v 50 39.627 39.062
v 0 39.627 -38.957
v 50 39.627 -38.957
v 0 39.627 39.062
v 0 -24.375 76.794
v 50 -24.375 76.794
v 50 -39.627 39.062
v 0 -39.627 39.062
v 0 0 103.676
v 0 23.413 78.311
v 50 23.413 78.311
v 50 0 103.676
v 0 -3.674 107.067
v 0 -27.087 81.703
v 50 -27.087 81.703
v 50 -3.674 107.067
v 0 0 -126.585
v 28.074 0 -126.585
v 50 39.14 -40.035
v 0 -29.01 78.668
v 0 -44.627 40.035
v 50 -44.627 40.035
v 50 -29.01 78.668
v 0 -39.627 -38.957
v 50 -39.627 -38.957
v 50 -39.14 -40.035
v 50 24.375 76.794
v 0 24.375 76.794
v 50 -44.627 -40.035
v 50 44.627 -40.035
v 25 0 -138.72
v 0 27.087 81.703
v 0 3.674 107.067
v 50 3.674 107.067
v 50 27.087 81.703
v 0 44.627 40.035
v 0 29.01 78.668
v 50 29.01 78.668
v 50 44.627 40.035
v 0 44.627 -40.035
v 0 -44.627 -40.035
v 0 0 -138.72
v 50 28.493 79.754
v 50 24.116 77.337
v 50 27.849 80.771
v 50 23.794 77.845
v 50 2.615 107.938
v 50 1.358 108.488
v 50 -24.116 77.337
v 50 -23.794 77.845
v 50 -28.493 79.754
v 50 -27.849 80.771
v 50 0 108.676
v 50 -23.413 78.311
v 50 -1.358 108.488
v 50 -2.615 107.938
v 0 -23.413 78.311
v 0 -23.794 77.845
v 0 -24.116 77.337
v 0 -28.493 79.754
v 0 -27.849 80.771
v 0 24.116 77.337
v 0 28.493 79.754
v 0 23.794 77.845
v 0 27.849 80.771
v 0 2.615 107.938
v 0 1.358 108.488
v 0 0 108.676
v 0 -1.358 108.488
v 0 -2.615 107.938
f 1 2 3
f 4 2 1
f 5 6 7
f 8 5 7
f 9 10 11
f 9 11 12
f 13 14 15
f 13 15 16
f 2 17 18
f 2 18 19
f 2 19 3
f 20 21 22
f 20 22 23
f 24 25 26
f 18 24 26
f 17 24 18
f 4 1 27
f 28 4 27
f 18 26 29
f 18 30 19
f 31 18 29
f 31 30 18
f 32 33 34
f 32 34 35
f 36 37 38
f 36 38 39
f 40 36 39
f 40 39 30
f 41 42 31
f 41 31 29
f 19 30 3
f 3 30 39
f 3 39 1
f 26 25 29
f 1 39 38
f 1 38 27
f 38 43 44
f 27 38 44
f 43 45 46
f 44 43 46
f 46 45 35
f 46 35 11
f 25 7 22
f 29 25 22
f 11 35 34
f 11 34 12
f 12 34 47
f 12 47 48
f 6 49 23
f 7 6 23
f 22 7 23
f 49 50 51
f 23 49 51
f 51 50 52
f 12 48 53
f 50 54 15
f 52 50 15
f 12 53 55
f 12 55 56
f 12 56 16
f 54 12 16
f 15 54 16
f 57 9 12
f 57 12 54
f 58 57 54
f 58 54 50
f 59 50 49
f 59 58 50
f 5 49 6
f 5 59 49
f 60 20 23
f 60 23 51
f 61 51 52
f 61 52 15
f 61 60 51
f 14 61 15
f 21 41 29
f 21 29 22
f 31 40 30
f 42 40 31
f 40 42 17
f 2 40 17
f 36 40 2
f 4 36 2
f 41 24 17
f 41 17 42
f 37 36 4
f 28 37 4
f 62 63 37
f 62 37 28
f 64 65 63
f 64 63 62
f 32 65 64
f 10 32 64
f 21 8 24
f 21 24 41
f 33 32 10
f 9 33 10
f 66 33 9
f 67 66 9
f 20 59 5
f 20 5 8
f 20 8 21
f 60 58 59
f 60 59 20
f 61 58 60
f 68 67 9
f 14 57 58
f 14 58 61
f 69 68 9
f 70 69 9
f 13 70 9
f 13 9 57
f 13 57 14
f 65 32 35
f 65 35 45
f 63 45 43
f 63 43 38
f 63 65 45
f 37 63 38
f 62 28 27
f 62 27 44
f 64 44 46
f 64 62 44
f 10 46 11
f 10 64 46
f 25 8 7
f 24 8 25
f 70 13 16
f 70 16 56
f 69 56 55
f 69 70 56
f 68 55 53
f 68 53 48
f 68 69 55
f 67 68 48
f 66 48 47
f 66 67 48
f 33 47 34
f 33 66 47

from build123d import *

# Parameters (mm, degrees)
BOSS_EXTRUDE1_DEPTH = 50
SHELL1_DEPTH        = 50
CUT_EXTRUDE2_DEPTH  = 173.364622498


# Read off the part's stored shape, not the designer's step: Shell1
with BuildPart() as part:
    # Sketch1 → Boss-Extrude1 (new body)
    with BuildSketch(Plane.YZ):
        with BuildLine():
            Line((-44.627499653, -40.034766679), (-44.627499653, 40.034766679))
            Line((-44.627499653, 40.034766679), (-29.010308673, 78.667639283))
            ThreePointArc((-29.010308673, 78.667639283), (-28.186204205, 80.272180413), (-27.087258828, 81.702571783))
            Line((-27.087258828, 81.702571783), (-3.674040134, 107.06723584))
            ThreePointArc((-3.674040134, 107.06723584), (0, 108.675860147), (3.674040134, 107.06723584))
            Line((3.674040134, 107.06723584), (27.087258828, 81.702571783))
            ThreePointArc((27.087258828, 81.702571783), (28.186204205, 80.272180413), (29.010308673, 78.667639283))
            Line((29.010308673, 78.667639283), (44.627499653, 40.034766679))
            Line((44.627499653, 40.034766679), (44.627499653, -40.034766679))
            Line((44.627499653, -40.034766679), (0, -138.719530665))
            Line((0, -138.719530665), (-44.627499653, -40.034766679))
        make_face()
    extrude(amount=BOSS_EXTRUDE1_DEPTH)

    # Shell1 outline → Shell1 (cut)
    with BuildSketch(Plane.YZ):
        with BuildLine():
            Line((-24.374743616, 76.79372984), (-39.627499653, 39.062374592))
            Line((-39.627499653, 39.062374592), (-39.627499653, -38.956762217))
            Line((-39.627499653, -38.956762217), (0, -126.585029116))
            Line((0, -126.585029116), (39.627499653, -38.956762217))
            Line((39.627499653, -38.956762217), (39.627499653, 39.062374592))
            Line((39.627499653, 39.062374592), (24.374743616, 76.79372984))
            ThreePointArc((24.374743616, 76.79372984), (23.962691382, 77.596000405), (23.413218693, 78.31119609))
            Line((23.413218693, 78.31119609), (0, 103.675860147))
            Line((0, 103.675860147), (-23.413218693, 78.31119609))
            ThreePointArc((-23.413218693, 78.31119609), (-23.962691382, 77.596000405), (-24.374743616, 76.79372984))
        make_face()
    extrude(amount=SHELL1_DEPTH, mode=Mode.SUBTRACT)

    # Sketch3 → Cut-Extrude2 (cut, through all)
    with BuildSketch(Plane(origin=(0, 44.627499653, 0), x_dir=(-1, 0, 0), z_dir=(0, 1, 0))):
        Polygon((-50, -40.034766679), (-25, -138.719530665), (-50, -138.719530665), align=None)
    extrude(amount=-CUT_EXTRUDE2_DEPTH, mode=Mode.SUBTRACT)


solid = part.part
